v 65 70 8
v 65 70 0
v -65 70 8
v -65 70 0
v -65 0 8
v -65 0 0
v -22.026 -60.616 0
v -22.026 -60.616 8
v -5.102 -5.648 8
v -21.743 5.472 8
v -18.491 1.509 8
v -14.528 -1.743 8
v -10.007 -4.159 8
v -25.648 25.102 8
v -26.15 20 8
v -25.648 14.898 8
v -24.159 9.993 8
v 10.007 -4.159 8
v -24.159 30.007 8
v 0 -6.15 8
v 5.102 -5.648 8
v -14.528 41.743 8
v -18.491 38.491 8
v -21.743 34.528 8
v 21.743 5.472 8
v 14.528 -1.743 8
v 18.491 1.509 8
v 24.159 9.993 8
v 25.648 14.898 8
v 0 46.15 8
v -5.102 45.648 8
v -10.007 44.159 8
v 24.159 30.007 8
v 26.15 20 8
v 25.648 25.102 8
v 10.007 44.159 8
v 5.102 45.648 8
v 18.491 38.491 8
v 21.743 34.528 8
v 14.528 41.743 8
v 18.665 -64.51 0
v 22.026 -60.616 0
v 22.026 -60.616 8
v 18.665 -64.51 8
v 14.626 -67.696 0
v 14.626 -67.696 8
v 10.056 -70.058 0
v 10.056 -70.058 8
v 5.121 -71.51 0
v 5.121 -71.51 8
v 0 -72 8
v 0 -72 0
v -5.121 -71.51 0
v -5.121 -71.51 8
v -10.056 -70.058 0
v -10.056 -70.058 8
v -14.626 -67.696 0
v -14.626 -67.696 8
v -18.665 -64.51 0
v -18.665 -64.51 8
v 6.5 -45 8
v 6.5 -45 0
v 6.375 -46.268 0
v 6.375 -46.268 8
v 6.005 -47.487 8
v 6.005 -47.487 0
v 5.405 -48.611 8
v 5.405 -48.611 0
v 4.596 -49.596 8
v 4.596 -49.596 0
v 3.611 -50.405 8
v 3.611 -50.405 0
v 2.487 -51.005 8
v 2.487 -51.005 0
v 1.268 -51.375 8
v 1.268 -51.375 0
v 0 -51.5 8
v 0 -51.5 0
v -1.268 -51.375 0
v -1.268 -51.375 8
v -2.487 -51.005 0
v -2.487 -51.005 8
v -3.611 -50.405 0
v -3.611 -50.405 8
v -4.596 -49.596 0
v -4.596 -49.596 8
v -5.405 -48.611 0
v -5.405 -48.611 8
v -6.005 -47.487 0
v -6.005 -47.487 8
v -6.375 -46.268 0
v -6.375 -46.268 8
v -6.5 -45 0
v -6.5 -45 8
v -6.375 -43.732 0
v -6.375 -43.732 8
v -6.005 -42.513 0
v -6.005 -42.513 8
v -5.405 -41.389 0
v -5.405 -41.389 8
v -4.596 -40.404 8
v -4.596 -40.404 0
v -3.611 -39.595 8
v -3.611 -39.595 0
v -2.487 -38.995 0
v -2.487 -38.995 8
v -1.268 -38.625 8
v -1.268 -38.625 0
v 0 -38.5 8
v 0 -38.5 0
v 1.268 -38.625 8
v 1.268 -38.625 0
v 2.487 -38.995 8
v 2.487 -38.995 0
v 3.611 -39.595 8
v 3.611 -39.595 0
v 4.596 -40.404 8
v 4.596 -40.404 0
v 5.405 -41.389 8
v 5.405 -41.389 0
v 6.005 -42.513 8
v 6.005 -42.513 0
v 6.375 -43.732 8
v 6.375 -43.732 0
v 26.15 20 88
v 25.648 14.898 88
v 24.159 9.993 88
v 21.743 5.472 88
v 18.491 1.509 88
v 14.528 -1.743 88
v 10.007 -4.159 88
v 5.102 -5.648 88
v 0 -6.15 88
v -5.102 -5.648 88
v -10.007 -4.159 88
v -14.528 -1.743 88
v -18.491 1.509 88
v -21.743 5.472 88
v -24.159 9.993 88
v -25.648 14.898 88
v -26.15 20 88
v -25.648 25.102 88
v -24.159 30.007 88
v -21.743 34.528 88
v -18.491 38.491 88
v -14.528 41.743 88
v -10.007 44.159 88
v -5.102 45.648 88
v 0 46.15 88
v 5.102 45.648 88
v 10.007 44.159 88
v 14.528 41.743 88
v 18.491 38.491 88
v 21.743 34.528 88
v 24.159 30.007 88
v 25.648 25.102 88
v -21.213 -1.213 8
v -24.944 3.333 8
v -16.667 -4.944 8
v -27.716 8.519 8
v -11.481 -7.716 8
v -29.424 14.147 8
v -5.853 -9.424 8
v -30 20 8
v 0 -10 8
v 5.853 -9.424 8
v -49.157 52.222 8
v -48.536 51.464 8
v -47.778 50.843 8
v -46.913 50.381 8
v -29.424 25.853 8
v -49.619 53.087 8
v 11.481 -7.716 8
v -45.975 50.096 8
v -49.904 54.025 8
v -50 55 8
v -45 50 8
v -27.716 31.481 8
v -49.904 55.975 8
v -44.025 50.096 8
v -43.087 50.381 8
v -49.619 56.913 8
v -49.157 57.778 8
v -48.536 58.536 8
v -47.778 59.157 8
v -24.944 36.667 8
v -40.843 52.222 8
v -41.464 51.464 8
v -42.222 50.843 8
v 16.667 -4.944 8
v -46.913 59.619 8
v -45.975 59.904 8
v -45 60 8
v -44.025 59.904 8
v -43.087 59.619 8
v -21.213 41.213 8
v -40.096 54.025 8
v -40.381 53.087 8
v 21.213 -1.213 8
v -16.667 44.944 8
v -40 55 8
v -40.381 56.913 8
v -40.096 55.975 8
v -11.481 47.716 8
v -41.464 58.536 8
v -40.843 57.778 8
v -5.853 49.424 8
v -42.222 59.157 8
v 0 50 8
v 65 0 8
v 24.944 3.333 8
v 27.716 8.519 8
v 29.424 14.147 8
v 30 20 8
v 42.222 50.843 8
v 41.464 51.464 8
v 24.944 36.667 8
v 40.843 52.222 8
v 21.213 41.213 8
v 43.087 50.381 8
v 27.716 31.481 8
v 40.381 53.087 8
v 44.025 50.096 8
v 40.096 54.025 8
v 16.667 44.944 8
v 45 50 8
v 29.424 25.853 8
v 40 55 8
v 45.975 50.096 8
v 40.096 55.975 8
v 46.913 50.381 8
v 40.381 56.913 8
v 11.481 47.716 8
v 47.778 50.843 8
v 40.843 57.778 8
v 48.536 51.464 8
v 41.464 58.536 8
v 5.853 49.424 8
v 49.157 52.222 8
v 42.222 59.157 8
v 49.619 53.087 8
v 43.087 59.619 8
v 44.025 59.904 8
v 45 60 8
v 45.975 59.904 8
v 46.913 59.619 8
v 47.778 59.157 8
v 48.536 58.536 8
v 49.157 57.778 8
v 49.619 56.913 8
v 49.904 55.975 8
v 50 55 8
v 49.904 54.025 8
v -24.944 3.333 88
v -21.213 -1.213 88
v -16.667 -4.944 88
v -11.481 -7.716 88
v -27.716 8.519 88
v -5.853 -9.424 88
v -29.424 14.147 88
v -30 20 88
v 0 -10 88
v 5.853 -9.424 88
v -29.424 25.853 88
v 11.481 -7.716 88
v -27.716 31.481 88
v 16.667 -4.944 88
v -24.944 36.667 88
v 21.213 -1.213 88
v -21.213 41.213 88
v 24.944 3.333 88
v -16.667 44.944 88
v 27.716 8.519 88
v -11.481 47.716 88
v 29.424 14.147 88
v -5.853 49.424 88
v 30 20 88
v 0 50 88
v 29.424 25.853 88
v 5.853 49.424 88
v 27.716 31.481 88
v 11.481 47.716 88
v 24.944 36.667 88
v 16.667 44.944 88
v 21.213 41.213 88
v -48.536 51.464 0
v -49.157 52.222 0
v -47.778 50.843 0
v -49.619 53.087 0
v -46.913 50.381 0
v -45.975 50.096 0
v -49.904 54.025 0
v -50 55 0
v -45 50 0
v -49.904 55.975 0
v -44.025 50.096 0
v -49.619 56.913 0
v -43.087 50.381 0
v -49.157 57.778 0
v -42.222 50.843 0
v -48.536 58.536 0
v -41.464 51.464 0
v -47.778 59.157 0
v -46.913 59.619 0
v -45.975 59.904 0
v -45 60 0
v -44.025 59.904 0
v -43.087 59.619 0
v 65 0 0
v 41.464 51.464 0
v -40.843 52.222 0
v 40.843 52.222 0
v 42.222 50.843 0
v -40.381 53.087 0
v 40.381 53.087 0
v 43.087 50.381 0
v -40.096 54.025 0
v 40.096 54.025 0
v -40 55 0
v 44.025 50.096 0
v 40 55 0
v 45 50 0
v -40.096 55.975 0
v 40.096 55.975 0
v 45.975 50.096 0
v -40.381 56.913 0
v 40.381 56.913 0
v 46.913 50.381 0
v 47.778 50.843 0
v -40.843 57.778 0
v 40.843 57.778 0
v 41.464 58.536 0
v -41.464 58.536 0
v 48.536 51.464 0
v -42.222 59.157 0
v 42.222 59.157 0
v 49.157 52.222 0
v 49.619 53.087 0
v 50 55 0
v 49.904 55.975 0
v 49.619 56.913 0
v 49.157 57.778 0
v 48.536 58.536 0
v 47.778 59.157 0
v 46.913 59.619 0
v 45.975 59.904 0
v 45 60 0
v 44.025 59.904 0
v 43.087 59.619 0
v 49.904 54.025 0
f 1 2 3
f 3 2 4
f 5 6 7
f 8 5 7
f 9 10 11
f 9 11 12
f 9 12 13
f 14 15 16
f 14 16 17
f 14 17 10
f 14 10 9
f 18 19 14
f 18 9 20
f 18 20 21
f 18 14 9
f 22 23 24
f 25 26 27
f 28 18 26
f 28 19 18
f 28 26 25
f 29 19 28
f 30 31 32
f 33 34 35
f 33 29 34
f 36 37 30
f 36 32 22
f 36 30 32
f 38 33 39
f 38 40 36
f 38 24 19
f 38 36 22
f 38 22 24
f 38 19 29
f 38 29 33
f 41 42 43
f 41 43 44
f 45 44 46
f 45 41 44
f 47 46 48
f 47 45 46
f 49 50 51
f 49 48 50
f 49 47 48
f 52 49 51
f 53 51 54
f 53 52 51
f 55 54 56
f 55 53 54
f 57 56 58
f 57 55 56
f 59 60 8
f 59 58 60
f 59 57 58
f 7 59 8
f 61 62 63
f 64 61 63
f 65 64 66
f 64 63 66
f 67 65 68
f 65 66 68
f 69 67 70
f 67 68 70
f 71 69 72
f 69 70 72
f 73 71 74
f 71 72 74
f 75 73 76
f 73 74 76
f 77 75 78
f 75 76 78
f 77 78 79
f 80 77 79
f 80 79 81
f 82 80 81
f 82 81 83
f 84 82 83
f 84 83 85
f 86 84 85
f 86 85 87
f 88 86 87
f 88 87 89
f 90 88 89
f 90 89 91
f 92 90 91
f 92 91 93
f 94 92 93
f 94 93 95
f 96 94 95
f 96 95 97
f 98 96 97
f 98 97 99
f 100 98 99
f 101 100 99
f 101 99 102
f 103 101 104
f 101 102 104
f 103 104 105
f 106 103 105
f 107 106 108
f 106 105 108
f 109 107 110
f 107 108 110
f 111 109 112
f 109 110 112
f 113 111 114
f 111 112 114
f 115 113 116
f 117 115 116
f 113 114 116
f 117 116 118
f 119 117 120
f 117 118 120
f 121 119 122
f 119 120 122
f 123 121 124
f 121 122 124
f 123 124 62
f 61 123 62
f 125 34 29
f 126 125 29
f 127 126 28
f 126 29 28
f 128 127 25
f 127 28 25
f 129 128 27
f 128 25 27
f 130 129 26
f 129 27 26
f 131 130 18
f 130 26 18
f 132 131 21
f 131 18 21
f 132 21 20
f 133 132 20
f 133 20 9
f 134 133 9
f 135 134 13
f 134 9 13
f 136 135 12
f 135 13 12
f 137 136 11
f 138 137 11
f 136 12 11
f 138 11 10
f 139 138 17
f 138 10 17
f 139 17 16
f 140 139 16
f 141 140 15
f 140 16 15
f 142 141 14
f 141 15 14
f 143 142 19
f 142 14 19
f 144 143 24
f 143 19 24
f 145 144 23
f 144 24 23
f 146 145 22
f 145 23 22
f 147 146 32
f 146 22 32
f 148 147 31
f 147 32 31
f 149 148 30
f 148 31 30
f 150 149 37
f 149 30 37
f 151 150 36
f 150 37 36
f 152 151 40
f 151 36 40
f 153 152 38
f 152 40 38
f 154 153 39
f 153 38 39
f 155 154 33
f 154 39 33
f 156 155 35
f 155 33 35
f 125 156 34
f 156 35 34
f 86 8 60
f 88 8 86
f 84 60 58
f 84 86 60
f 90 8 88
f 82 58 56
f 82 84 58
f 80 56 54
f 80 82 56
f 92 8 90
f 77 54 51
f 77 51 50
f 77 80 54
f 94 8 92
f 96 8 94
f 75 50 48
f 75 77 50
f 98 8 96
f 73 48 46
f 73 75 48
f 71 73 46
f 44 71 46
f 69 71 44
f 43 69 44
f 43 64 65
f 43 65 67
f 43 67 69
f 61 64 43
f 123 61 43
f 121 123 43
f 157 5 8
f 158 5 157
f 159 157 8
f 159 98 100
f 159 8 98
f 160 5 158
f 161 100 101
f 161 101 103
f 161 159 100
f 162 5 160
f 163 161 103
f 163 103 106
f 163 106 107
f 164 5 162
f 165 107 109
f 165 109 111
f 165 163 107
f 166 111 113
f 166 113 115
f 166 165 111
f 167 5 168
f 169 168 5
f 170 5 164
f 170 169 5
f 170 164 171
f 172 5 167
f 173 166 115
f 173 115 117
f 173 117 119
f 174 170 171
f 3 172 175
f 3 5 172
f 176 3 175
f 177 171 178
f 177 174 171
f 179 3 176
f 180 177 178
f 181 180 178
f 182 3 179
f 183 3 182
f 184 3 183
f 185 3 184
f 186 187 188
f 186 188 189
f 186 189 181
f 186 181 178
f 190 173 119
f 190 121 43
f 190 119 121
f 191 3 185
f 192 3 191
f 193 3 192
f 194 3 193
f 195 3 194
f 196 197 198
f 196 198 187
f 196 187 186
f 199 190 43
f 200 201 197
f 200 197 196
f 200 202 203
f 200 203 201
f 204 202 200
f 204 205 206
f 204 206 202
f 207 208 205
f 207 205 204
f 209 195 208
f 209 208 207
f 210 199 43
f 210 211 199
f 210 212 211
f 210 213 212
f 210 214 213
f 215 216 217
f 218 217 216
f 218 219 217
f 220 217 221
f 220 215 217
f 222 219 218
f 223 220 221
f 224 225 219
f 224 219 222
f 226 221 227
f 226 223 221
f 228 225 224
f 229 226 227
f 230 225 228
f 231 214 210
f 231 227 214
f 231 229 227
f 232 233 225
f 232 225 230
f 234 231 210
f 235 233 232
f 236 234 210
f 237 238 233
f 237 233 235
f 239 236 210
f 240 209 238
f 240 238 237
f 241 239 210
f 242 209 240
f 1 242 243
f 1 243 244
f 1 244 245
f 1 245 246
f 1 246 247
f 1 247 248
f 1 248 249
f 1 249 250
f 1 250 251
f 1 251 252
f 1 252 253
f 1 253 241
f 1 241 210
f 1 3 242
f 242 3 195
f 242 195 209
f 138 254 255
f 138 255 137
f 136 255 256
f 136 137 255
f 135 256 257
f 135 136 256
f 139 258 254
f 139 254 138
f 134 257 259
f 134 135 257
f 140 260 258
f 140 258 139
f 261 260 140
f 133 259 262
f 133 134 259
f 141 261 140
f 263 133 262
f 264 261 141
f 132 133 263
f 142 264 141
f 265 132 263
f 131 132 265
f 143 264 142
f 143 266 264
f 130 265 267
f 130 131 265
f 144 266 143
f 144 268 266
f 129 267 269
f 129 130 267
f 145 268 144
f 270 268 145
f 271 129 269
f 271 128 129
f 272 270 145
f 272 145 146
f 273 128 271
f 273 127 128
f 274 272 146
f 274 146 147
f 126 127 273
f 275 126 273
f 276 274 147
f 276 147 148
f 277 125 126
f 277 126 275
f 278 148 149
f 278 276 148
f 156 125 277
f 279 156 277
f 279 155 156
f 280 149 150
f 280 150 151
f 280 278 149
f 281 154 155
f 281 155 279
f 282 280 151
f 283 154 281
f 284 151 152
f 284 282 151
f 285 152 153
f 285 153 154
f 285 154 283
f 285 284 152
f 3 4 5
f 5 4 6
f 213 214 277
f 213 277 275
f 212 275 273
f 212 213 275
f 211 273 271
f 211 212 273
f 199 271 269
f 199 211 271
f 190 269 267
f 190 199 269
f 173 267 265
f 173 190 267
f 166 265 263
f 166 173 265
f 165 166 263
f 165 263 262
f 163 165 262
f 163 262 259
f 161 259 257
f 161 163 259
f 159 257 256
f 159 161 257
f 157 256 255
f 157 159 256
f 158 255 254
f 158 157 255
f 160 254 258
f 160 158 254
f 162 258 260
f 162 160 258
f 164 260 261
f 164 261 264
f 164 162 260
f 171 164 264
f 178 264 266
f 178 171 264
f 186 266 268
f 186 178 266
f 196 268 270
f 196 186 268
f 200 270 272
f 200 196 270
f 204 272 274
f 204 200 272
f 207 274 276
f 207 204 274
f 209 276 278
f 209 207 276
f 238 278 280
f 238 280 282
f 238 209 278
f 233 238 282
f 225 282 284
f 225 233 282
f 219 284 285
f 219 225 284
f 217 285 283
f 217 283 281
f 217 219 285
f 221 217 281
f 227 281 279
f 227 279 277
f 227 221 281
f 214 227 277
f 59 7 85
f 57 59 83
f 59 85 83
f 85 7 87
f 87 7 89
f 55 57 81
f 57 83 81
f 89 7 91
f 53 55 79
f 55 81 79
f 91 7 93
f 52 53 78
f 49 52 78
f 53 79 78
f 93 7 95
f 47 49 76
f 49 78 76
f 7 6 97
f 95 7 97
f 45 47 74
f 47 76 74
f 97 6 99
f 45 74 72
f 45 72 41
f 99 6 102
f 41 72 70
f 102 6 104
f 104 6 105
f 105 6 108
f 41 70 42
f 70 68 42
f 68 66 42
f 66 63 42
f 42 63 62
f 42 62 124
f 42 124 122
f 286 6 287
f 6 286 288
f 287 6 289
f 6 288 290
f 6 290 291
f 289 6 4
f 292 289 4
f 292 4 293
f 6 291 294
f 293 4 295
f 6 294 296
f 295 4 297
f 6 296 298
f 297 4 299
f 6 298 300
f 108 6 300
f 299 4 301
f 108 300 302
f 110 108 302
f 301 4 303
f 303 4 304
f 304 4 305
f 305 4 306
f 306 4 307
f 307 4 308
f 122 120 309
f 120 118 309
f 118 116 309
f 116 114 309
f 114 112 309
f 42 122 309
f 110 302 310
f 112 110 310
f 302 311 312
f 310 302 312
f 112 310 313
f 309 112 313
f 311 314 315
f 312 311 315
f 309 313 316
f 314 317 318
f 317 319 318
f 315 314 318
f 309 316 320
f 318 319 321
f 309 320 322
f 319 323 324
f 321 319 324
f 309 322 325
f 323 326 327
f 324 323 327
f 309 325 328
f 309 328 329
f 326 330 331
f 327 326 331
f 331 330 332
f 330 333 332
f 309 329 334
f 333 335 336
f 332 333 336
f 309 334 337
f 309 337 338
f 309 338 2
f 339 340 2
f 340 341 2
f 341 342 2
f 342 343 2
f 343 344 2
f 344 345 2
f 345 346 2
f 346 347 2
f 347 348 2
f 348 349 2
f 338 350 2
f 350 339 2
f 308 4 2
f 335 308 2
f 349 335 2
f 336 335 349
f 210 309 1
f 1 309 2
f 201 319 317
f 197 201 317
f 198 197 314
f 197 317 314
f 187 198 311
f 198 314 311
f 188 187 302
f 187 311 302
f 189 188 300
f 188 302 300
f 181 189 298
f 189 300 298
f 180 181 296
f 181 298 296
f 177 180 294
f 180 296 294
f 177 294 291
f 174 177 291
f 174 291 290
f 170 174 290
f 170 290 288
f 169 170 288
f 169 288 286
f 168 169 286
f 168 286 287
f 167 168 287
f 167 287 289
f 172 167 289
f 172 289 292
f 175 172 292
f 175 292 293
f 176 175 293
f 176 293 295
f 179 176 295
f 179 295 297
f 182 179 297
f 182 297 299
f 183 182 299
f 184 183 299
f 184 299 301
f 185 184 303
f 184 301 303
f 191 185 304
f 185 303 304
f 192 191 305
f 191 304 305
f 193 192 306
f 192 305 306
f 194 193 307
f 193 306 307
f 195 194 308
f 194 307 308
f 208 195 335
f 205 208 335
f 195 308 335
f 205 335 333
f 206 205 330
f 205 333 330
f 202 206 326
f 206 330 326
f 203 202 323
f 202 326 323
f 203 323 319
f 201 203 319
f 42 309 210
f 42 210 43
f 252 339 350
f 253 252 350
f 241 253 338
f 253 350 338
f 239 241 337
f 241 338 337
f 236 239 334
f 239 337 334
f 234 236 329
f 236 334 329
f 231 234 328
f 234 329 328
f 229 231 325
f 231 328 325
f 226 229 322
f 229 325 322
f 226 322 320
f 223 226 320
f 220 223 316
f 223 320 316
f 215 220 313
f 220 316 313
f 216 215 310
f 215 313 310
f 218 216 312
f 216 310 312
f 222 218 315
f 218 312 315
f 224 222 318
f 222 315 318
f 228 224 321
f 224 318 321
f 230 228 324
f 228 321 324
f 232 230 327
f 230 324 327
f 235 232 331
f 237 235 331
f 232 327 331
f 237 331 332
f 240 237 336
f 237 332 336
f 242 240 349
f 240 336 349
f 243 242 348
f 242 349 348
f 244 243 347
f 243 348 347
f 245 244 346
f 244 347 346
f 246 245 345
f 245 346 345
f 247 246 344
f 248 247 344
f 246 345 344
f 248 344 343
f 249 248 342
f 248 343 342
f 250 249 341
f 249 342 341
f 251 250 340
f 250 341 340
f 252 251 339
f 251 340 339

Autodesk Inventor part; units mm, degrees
ref_plane "YZ Plane" through (0, 0, 0) normal (1, 0, 0) x (0, 1, 0)
ref_plane "XZ Plane" through (0, 0, 0) normal (0, 1, 0) x (-1, 0, 0)
ref_plane "XY Plane" through (0, 0, 0) normal (0, 0, 1) x (1, 0, 0)
sketch "Boceto1" plane through (0, 0, 0) normal (0, 0, 1) x (1, 0, 0)
  line L0 (0, 0) -> (0, 40)
  line L1 (65, 70) -> (-65, 70)
  line L2 (-65, 70) -> (-65, 10)
  line L3 (-65, 10) -> (65, 10)
  line L4 (65, 10) -> (65, 70)
  line L5 (65, 70) -> (-65, 10) construction
  line L6 (-65, 70) -> (65, 10) construction
  line L7 (65, 70) -> (-65, 70)
  line L8 (-65, 70) -> (-65, 0)
  line L9 (65, 0) -> (65, 70)
  line L10 (65, 70) -> (65, 40)
  line L11 (65, 55) -> (-65, 55)
  line L12 (65, 55) -> (45, 55)
  circle A0 centre (45, 55) radius 5
  line L13 (-65, 55) -> (-62.9791, 55)
  line L14 (-65, 55) -> (-45, 55)
  circle A1 centre (-45, 55) radius 5
  line L15 (6.5, -45) -> (-6.5, -45)
  circle A2 centre (0, -45) radius 6.5
  arc A3 (-22.0262, -60.6156) -> (22.0262, -60.6156) centre (0, -45) ccw
  line L16 (65, 0) -> (22.0262, -60.6156)
  line L17 (-65, 0) -> (-22.0262, -60.6156)
  dimension "d0" = 130
  dimension "d1" = 60
  dimension "d2" = 20
  dimension "d3" = 10
  dimension "d4" = 20
  dimension "d5" = 10
  dimension "d6" = 13
extrude "Extrusión1" add sketch "Boceto1" along normal blind 8 contours L4 L11 A0 A1 L2 L1 | L4 L3 L2 L11 A1 A0 | L3 L9 L16 A3 L17 L8
sketch "Boceto2" plane through (0, 0, 8) normal (0, 0, 1) x (1, 0, 0)
  line L0 (65, 70) -> (-65, 70) projected
  line L1 (-65, 70) -> (-65, 40)
  line L2 (-65, 70) -> (-65, 0) projected
  line L3 (65, 0) -> (65, 70) projected
  line L4 (-65, 70) -> (-65, 50)
  line L5 (-65, 50) -> (65, 50)
  line L6 (-65, 50) -> (-65, -30)
  line L7 (-65, -30) -> (65, -30)
  line L8 (0, 50) -> (0, -30)
  line L9 (0, 10) -> (0, 20)
  circle A0 centre (0, 20) radius 30
  circle A1 centre (0, 20) radius 26.15
  point P0 (0, 0)
  dimension "d13" = 30
  dimension "d15" = 20
  dimension "d16" = 80
  dimension "d23" = 10
  dimension "d24" = 52.3
extrude "Extrusión4" add sketch "Boceto2" along normal blind 80 contours A0 L8 A1 | L8 A1 A0
properties part number "encaje"
